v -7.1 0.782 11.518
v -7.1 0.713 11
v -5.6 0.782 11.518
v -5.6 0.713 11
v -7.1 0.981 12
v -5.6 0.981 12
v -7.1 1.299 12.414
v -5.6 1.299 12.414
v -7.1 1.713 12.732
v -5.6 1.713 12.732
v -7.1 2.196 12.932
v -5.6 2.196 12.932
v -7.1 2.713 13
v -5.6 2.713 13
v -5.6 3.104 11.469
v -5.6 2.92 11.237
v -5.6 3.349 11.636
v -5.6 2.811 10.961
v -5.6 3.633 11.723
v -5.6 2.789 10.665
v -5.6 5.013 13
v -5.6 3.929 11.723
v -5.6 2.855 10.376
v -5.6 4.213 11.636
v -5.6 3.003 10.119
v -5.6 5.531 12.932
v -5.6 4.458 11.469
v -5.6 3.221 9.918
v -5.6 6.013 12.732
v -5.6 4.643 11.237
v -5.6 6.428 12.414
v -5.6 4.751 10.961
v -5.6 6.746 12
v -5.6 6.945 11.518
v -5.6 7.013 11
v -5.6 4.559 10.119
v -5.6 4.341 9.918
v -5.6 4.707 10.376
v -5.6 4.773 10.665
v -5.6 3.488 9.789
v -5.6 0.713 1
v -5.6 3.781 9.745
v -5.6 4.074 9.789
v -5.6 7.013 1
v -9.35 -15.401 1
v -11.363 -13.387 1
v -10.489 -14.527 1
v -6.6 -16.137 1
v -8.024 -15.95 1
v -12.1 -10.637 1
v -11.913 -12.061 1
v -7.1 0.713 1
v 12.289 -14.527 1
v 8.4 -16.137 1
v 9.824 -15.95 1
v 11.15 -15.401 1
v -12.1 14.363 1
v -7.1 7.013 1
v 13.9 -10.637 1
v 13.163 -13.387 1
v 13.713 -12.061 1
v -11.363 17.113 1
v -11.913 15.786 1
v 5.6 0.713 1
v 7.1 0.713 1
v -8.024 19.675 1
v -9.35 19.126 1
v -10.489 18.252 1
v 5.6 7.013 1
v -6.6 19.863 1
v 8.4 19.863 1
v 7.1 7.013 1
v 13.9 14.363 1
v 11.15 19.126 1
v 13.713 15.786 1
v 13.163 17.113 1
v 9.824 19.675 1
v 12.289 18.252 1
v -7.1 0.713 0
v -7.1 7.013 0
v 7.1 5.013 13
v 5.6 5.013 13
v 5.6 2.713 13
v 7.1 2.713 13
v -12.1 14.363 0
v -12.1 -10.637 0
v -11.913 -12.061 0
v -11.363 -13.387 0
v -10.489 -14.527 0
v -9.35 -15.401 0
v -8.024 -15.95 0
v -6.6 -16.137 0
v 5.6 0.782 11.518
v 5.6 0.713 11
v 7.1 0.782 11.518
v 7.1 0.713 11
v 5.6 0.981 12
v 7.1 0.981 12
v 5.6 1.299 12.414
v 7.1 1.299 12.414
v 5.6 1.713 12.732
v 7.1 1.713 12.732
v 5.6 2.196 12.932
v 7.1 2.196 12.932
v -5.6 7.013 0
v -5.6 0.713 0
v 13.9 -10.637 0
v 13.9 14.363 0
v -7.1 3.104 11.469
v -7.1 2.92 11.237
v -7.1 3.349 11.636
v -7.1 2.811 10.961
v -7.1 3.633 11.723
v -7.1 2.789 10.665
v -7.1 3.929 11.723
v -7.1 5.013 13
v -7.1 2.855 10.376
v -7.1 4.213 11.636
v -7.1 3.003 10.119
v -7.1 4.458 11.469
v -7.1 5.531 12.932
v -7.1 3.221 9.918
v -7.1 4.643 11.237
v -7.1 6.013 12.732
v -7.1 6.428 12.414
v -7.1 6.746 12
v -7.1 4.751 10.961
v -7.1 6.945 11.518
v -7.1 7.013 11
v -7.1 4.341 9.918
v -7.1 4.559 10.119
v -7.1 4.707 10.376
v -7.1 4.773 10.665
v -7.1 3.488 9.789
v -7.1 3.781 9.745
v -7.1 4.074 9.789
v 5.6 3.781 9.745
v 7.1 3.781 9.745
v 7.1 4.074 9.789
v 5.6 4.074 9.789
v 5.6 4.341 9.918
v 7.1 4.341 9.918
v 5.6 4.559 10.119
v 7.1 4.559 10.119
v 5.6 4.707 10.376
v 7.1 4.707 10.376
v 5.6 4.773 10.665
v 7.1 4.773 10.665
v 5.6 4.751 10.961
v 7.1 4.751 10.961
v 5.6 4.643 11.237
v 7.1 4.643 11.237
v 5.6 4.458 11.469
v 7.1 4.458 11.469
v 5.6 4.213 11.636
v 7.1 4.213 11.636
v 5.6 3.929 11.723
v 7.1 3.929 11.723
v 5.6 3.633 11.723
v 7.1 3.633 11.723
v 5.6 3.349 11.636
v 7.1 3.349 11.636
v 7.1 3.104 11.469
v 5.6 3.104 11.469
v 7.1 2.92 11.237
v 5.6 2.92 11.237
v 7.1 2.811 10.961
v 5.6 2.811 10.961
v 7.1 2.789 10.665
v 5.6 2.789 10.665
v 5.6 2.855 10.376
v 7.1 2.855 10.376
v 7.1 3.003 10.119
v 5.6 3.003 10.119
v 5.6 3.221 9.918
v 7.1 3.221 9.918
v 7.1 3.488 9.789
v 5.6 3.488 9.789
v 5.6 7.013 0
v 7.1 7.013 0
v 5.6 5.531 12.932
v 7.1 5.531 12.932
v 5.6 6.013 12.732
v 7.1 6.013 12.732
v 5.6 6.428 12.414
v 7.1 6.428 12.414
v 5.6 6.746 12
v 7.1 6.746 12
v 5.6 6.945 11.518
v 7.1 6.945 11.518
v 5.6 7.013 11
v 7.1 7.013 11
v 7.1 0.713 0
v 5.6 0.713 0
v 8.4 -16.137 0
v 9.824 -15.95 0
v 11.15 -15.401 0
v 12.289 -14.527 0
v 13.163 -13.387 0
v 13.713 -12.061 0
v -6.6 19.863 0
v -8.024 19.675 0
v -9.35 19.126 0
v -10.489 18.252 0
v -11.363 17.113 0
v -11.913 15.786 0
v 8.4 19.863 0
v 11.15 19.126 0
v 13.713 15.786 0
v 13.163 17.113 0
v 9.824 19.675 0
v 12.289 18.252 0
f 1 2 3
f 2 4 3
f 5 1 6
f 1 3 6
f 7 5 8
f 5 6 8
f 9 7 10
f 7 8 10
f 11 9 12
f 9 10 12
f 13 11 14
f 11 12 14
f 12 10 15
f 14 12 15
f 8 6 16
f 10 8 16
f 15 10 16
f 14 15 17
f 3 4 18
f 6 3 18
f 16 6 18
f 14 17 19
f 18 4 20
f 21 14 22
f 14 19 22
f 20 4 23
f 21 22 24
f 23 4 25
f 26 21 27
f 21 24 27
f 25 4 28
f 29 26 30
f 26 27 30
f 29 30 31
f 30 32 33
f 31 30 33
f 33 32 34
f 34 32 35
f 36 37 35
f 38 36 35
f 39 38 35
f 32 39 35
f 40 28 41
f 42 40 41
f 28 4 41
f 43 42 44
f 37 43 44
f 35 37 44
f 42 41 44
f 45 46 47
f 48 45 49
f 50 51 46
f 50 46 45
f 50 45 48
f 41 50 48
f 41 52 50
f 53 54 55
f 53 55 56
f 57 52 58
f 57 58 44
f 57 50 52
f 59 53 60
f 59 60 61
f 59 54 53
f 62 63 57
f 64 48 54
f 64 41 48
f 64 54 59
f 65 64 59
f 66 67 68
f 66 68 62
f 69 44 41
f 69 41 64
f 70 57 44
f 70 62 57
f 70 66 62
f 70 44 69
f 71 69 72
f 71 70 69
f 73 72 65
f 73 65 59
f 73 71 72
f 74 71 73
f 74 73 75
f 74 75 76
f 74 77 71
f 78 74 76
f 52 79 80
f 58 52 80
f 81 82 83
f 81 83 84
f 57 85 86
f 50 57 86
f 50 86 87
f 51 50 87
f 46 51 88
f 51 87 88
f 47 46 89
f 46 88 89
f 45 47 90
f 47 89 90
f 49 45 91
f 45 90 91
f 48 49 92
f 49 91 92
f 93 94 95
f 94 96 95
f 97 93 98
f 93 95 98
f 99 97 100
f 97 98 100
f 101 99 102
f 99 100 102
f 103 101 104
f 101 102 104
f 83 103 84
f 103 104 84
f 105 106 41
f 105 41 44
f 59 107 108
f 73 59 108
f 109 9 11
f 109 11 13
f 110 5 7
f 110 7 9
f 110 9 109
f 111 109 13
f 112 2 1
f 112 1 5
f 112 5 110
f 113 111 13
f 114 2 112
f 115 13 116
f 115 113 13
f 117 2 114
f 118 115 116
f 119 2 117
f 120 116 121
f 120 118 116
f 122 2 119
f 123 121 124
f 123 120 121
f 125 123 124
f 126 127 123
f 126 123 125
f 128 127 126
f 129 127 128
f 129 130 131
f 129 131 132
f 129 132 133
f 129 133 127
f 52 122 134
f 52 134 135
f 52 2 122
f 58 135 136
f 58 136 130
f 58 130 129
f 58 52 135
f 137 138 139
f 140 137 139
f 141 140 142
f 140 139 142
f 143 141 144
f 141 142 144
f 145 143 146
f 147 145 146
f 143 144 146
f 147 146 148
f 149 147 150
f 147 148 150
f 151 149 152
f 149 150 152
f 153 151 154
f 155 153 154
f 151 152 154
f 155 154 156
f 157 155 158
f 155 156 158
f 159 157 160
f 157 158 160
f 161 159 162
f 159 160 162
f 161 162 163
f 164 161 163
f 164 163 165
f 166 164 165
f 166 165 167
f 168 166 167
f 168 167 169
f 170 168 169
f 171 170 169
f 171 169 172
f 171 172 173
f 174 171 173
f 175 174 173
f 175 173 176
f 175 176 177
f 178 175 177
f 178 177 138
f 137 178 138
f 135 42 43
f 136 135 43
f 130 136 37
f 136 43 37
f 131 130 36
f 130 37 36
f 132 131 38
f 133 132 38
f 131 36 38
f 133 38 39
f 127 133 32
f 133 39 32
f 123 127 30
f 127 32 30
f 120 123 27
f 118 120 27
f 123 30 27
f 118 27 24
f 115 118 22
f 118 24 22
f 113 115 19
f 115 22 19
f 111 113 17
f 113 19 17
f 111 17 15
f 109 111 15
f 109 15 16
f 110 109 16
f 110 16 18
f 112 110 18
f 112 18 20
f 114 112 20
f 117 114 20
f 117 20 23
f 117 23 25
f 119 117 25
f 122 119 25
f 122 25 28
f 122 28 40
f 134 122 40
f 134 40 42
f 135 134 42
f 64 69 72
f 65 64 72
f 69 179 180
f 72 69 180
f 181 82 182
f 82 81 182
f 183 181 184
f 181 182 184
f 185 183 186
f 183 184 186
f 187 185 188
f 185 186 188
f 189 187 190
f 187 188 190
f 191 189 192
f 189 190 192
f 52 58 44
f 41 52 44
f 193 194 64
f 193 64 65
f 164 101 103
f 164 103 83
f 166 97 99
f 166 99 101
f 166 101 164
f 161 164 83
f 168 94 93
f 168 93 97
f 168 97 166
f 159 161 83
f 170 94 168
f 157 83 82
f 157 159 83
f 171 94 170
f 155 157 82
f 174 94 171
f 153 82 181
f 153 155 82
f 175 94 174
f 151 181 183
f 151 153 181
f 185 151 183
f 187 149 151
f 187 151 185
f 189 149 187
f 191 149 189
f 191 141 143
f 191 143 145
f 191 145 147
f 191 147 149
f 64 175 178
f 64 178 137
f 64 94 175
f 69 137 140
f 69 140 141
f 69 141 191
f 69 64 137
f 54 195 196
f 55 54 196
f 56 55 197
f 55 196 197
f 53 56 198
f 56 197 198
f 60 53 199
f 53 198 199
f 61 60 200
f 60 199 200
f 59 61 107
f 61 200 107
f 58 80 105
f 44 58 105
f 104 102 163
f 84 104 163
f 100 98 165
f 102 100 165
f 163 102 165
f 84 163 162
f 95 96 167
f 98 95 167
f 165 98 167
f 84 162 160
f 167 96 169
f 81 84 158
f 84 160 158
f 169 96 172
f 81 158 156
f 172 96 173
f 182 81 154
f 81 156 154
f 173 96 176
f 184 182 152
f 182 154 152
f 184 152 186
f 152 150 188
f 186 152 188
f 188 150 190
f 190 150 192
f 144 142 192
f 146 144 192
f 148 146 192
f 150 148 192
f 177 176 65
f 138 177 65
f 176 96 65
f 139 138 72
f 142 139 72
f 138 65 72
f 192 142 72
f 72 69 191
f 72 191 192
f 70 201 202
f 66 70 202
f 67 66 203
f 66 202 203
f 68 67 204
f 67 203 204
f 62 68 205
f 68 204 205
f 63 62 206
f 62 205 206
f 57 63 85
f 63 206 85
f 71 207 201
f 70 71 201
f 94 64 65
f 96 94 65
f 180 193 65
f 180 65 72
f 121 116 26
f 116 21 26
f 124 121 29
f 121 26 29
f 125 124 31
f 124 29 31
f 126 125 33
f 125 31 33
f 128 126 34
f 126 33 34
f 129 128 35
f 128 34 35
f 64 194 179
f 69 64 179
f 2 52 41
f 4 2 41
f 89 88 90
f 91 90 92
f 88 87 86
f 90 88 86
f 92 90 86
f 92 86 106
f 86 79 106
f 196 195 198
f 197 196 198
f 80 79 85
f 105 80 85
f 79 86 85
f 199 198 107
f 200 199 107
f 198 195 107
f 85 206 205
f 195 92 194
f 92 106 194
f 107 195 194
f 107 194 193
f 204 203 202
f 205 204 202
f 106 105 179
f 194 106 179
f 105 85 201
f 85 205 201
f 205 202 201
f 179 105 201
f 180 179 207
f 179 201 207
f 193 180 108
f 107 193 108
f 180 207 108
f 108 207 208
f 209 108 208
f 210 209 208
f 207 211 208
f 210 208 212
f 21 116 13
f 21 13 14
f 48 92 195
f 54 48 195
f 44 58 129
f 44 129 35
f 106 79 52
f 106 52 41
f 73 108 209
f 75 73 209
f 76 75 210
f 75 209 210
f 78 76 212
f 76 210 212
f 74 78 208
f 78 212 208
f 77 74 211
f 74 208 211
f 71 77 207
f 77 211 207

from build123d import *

# Parameters (mm, degrees)
SKETCH1_W             = 1.5
SKETCH1_H             = 6.3
BOSS_EXTRUDE1_DEPTH   = 1
SKETCH2_W             = 1.5
SKETCH2_H             = 6.3
BOSS_EXTRUDE2_DEPTH   = 12
BOSS_EXTRUDE2_2_DEPTH = 12
SKETCH3_R             = 0.994767201
CUT_EXTRUDE1_DEPTH    = 20.2
FILLET1_R             = 2
FILLET2_R             = 2


with BuildPart() as part:
    # Sketch1 → Boss-Extrude1 (new body)
    with BuildSketch(Plane.XY):
        with BuildLine():
            Line((13.9, -10.637455146), (13.9, 14.362544854))
            ThreePointArc((13.9, 14.362544854), (12.289087297, 18.251632151), (8.4, 19.862544854))
            Line((8.4, 19.862544854), (-6.6, 19.862544854))
            ThreePointArc((-6.6, 19.862544854), (-10.489087297, 18.251632151), (-12.1, 14.362544854))
            Line((-12.1, 14.362544854), (-12.1, -10.637455146))
            ThreePointArc((-12.1, -10.637455146), (-10.489087297, -14.526542442), (-6.6, -16.137455146))
            Line((-6.6, -16.137455146), (8.4, -16.137455146))
            ThreePointArc((8.4, -16.137455146), (12.289087297, -14.526542442), (13.9, -10.637455146))
        make_face()
        with Locations((-6.35, 3.863496204)):
            Rectangle(SKETCH1_W, SKETCH1_H, mode=Mode.SUBTRACT)
        with Locations((6.35, 3.863496204)):
            Rectangle(SKETCH1_W, SKETCH1_H, mode=Mode.SUBTRACT)
    extrude(amount=BOSS_EXTRUDE1_DEPTH)


with BuildPart() as body_2:
    # Sketch2 → Boss-Extrude2 (new body)
    with BuildSketch(Plane.XY.offset(1)):
        with Locations((-6.35, 3.863496204)):
            Rectangle(SKETCH2_W, SKETCH2_H)
    extrude(amount=BOSS_EXTRUDE2_DEPTH)


with BuildPart() as body_3:
    # Sketch2 → Boss-Extrude2 2 (new body)
    with BuildSketch(Plane.XY.offset(1)):
        with Locations((6.35, 3.863496204)):
            Rectangle(SKETCH2_W, SKETCH2_H)
    extrude(amount=BOSS_EXTRUDE2_2_DEPTH)


with BuildPart() as cut_extrude1_tool:
    # Sketch3 → Cut-Extrude1 (new body, through all)
    with BuildSketch(Plane(origin=(7.1, 0, 0), x_dir=(0, 0, -1), z_dir=(1, 0, 0))):
        with Locations((-10.739603072, 3.781024457)):
            Circle(SKETCH3_R)
    extrude(amount=-CUT_EXTRUDE1_DEPTH)


with BuildPart() as body_2_1:
    add(body_2.part)

    # Cut-Extrude1: cut by cut_extrude1_tool
    add(cut_extrude1_tool.part, mode=Mode.SUBTRACT)

    # Fillet2
    fillet2_edges = [body_2_1.edges().sort_by_distance(p)[0] for p in [
        (-6.35, 7.013496204, 13),
        (-6.35, 0.713496204, 13),
    ]]
    fillet(fillet2_edges, radius=FILLET2_R)


with BuildPart() as body_3_1:
    add(body_3.part)

    # Cut-Extrude1: cut by cut_extrude1_tool
    add(cut_extrude1_tool.part, mode=Mode.SUBTRACT)

    # Fillet1
    fillet1_edges = [body_3_1.edges().sort_by_distance(p)[0] for p in [
        (6.35, 0.713496204, 13),
        (6.35, 7.013496204, 13),
    ]]
    fillet(fillet1_edges, radius=FILLET1_R)


solid = Compound([part.part, body_2_1.part, body_3_1.part])
